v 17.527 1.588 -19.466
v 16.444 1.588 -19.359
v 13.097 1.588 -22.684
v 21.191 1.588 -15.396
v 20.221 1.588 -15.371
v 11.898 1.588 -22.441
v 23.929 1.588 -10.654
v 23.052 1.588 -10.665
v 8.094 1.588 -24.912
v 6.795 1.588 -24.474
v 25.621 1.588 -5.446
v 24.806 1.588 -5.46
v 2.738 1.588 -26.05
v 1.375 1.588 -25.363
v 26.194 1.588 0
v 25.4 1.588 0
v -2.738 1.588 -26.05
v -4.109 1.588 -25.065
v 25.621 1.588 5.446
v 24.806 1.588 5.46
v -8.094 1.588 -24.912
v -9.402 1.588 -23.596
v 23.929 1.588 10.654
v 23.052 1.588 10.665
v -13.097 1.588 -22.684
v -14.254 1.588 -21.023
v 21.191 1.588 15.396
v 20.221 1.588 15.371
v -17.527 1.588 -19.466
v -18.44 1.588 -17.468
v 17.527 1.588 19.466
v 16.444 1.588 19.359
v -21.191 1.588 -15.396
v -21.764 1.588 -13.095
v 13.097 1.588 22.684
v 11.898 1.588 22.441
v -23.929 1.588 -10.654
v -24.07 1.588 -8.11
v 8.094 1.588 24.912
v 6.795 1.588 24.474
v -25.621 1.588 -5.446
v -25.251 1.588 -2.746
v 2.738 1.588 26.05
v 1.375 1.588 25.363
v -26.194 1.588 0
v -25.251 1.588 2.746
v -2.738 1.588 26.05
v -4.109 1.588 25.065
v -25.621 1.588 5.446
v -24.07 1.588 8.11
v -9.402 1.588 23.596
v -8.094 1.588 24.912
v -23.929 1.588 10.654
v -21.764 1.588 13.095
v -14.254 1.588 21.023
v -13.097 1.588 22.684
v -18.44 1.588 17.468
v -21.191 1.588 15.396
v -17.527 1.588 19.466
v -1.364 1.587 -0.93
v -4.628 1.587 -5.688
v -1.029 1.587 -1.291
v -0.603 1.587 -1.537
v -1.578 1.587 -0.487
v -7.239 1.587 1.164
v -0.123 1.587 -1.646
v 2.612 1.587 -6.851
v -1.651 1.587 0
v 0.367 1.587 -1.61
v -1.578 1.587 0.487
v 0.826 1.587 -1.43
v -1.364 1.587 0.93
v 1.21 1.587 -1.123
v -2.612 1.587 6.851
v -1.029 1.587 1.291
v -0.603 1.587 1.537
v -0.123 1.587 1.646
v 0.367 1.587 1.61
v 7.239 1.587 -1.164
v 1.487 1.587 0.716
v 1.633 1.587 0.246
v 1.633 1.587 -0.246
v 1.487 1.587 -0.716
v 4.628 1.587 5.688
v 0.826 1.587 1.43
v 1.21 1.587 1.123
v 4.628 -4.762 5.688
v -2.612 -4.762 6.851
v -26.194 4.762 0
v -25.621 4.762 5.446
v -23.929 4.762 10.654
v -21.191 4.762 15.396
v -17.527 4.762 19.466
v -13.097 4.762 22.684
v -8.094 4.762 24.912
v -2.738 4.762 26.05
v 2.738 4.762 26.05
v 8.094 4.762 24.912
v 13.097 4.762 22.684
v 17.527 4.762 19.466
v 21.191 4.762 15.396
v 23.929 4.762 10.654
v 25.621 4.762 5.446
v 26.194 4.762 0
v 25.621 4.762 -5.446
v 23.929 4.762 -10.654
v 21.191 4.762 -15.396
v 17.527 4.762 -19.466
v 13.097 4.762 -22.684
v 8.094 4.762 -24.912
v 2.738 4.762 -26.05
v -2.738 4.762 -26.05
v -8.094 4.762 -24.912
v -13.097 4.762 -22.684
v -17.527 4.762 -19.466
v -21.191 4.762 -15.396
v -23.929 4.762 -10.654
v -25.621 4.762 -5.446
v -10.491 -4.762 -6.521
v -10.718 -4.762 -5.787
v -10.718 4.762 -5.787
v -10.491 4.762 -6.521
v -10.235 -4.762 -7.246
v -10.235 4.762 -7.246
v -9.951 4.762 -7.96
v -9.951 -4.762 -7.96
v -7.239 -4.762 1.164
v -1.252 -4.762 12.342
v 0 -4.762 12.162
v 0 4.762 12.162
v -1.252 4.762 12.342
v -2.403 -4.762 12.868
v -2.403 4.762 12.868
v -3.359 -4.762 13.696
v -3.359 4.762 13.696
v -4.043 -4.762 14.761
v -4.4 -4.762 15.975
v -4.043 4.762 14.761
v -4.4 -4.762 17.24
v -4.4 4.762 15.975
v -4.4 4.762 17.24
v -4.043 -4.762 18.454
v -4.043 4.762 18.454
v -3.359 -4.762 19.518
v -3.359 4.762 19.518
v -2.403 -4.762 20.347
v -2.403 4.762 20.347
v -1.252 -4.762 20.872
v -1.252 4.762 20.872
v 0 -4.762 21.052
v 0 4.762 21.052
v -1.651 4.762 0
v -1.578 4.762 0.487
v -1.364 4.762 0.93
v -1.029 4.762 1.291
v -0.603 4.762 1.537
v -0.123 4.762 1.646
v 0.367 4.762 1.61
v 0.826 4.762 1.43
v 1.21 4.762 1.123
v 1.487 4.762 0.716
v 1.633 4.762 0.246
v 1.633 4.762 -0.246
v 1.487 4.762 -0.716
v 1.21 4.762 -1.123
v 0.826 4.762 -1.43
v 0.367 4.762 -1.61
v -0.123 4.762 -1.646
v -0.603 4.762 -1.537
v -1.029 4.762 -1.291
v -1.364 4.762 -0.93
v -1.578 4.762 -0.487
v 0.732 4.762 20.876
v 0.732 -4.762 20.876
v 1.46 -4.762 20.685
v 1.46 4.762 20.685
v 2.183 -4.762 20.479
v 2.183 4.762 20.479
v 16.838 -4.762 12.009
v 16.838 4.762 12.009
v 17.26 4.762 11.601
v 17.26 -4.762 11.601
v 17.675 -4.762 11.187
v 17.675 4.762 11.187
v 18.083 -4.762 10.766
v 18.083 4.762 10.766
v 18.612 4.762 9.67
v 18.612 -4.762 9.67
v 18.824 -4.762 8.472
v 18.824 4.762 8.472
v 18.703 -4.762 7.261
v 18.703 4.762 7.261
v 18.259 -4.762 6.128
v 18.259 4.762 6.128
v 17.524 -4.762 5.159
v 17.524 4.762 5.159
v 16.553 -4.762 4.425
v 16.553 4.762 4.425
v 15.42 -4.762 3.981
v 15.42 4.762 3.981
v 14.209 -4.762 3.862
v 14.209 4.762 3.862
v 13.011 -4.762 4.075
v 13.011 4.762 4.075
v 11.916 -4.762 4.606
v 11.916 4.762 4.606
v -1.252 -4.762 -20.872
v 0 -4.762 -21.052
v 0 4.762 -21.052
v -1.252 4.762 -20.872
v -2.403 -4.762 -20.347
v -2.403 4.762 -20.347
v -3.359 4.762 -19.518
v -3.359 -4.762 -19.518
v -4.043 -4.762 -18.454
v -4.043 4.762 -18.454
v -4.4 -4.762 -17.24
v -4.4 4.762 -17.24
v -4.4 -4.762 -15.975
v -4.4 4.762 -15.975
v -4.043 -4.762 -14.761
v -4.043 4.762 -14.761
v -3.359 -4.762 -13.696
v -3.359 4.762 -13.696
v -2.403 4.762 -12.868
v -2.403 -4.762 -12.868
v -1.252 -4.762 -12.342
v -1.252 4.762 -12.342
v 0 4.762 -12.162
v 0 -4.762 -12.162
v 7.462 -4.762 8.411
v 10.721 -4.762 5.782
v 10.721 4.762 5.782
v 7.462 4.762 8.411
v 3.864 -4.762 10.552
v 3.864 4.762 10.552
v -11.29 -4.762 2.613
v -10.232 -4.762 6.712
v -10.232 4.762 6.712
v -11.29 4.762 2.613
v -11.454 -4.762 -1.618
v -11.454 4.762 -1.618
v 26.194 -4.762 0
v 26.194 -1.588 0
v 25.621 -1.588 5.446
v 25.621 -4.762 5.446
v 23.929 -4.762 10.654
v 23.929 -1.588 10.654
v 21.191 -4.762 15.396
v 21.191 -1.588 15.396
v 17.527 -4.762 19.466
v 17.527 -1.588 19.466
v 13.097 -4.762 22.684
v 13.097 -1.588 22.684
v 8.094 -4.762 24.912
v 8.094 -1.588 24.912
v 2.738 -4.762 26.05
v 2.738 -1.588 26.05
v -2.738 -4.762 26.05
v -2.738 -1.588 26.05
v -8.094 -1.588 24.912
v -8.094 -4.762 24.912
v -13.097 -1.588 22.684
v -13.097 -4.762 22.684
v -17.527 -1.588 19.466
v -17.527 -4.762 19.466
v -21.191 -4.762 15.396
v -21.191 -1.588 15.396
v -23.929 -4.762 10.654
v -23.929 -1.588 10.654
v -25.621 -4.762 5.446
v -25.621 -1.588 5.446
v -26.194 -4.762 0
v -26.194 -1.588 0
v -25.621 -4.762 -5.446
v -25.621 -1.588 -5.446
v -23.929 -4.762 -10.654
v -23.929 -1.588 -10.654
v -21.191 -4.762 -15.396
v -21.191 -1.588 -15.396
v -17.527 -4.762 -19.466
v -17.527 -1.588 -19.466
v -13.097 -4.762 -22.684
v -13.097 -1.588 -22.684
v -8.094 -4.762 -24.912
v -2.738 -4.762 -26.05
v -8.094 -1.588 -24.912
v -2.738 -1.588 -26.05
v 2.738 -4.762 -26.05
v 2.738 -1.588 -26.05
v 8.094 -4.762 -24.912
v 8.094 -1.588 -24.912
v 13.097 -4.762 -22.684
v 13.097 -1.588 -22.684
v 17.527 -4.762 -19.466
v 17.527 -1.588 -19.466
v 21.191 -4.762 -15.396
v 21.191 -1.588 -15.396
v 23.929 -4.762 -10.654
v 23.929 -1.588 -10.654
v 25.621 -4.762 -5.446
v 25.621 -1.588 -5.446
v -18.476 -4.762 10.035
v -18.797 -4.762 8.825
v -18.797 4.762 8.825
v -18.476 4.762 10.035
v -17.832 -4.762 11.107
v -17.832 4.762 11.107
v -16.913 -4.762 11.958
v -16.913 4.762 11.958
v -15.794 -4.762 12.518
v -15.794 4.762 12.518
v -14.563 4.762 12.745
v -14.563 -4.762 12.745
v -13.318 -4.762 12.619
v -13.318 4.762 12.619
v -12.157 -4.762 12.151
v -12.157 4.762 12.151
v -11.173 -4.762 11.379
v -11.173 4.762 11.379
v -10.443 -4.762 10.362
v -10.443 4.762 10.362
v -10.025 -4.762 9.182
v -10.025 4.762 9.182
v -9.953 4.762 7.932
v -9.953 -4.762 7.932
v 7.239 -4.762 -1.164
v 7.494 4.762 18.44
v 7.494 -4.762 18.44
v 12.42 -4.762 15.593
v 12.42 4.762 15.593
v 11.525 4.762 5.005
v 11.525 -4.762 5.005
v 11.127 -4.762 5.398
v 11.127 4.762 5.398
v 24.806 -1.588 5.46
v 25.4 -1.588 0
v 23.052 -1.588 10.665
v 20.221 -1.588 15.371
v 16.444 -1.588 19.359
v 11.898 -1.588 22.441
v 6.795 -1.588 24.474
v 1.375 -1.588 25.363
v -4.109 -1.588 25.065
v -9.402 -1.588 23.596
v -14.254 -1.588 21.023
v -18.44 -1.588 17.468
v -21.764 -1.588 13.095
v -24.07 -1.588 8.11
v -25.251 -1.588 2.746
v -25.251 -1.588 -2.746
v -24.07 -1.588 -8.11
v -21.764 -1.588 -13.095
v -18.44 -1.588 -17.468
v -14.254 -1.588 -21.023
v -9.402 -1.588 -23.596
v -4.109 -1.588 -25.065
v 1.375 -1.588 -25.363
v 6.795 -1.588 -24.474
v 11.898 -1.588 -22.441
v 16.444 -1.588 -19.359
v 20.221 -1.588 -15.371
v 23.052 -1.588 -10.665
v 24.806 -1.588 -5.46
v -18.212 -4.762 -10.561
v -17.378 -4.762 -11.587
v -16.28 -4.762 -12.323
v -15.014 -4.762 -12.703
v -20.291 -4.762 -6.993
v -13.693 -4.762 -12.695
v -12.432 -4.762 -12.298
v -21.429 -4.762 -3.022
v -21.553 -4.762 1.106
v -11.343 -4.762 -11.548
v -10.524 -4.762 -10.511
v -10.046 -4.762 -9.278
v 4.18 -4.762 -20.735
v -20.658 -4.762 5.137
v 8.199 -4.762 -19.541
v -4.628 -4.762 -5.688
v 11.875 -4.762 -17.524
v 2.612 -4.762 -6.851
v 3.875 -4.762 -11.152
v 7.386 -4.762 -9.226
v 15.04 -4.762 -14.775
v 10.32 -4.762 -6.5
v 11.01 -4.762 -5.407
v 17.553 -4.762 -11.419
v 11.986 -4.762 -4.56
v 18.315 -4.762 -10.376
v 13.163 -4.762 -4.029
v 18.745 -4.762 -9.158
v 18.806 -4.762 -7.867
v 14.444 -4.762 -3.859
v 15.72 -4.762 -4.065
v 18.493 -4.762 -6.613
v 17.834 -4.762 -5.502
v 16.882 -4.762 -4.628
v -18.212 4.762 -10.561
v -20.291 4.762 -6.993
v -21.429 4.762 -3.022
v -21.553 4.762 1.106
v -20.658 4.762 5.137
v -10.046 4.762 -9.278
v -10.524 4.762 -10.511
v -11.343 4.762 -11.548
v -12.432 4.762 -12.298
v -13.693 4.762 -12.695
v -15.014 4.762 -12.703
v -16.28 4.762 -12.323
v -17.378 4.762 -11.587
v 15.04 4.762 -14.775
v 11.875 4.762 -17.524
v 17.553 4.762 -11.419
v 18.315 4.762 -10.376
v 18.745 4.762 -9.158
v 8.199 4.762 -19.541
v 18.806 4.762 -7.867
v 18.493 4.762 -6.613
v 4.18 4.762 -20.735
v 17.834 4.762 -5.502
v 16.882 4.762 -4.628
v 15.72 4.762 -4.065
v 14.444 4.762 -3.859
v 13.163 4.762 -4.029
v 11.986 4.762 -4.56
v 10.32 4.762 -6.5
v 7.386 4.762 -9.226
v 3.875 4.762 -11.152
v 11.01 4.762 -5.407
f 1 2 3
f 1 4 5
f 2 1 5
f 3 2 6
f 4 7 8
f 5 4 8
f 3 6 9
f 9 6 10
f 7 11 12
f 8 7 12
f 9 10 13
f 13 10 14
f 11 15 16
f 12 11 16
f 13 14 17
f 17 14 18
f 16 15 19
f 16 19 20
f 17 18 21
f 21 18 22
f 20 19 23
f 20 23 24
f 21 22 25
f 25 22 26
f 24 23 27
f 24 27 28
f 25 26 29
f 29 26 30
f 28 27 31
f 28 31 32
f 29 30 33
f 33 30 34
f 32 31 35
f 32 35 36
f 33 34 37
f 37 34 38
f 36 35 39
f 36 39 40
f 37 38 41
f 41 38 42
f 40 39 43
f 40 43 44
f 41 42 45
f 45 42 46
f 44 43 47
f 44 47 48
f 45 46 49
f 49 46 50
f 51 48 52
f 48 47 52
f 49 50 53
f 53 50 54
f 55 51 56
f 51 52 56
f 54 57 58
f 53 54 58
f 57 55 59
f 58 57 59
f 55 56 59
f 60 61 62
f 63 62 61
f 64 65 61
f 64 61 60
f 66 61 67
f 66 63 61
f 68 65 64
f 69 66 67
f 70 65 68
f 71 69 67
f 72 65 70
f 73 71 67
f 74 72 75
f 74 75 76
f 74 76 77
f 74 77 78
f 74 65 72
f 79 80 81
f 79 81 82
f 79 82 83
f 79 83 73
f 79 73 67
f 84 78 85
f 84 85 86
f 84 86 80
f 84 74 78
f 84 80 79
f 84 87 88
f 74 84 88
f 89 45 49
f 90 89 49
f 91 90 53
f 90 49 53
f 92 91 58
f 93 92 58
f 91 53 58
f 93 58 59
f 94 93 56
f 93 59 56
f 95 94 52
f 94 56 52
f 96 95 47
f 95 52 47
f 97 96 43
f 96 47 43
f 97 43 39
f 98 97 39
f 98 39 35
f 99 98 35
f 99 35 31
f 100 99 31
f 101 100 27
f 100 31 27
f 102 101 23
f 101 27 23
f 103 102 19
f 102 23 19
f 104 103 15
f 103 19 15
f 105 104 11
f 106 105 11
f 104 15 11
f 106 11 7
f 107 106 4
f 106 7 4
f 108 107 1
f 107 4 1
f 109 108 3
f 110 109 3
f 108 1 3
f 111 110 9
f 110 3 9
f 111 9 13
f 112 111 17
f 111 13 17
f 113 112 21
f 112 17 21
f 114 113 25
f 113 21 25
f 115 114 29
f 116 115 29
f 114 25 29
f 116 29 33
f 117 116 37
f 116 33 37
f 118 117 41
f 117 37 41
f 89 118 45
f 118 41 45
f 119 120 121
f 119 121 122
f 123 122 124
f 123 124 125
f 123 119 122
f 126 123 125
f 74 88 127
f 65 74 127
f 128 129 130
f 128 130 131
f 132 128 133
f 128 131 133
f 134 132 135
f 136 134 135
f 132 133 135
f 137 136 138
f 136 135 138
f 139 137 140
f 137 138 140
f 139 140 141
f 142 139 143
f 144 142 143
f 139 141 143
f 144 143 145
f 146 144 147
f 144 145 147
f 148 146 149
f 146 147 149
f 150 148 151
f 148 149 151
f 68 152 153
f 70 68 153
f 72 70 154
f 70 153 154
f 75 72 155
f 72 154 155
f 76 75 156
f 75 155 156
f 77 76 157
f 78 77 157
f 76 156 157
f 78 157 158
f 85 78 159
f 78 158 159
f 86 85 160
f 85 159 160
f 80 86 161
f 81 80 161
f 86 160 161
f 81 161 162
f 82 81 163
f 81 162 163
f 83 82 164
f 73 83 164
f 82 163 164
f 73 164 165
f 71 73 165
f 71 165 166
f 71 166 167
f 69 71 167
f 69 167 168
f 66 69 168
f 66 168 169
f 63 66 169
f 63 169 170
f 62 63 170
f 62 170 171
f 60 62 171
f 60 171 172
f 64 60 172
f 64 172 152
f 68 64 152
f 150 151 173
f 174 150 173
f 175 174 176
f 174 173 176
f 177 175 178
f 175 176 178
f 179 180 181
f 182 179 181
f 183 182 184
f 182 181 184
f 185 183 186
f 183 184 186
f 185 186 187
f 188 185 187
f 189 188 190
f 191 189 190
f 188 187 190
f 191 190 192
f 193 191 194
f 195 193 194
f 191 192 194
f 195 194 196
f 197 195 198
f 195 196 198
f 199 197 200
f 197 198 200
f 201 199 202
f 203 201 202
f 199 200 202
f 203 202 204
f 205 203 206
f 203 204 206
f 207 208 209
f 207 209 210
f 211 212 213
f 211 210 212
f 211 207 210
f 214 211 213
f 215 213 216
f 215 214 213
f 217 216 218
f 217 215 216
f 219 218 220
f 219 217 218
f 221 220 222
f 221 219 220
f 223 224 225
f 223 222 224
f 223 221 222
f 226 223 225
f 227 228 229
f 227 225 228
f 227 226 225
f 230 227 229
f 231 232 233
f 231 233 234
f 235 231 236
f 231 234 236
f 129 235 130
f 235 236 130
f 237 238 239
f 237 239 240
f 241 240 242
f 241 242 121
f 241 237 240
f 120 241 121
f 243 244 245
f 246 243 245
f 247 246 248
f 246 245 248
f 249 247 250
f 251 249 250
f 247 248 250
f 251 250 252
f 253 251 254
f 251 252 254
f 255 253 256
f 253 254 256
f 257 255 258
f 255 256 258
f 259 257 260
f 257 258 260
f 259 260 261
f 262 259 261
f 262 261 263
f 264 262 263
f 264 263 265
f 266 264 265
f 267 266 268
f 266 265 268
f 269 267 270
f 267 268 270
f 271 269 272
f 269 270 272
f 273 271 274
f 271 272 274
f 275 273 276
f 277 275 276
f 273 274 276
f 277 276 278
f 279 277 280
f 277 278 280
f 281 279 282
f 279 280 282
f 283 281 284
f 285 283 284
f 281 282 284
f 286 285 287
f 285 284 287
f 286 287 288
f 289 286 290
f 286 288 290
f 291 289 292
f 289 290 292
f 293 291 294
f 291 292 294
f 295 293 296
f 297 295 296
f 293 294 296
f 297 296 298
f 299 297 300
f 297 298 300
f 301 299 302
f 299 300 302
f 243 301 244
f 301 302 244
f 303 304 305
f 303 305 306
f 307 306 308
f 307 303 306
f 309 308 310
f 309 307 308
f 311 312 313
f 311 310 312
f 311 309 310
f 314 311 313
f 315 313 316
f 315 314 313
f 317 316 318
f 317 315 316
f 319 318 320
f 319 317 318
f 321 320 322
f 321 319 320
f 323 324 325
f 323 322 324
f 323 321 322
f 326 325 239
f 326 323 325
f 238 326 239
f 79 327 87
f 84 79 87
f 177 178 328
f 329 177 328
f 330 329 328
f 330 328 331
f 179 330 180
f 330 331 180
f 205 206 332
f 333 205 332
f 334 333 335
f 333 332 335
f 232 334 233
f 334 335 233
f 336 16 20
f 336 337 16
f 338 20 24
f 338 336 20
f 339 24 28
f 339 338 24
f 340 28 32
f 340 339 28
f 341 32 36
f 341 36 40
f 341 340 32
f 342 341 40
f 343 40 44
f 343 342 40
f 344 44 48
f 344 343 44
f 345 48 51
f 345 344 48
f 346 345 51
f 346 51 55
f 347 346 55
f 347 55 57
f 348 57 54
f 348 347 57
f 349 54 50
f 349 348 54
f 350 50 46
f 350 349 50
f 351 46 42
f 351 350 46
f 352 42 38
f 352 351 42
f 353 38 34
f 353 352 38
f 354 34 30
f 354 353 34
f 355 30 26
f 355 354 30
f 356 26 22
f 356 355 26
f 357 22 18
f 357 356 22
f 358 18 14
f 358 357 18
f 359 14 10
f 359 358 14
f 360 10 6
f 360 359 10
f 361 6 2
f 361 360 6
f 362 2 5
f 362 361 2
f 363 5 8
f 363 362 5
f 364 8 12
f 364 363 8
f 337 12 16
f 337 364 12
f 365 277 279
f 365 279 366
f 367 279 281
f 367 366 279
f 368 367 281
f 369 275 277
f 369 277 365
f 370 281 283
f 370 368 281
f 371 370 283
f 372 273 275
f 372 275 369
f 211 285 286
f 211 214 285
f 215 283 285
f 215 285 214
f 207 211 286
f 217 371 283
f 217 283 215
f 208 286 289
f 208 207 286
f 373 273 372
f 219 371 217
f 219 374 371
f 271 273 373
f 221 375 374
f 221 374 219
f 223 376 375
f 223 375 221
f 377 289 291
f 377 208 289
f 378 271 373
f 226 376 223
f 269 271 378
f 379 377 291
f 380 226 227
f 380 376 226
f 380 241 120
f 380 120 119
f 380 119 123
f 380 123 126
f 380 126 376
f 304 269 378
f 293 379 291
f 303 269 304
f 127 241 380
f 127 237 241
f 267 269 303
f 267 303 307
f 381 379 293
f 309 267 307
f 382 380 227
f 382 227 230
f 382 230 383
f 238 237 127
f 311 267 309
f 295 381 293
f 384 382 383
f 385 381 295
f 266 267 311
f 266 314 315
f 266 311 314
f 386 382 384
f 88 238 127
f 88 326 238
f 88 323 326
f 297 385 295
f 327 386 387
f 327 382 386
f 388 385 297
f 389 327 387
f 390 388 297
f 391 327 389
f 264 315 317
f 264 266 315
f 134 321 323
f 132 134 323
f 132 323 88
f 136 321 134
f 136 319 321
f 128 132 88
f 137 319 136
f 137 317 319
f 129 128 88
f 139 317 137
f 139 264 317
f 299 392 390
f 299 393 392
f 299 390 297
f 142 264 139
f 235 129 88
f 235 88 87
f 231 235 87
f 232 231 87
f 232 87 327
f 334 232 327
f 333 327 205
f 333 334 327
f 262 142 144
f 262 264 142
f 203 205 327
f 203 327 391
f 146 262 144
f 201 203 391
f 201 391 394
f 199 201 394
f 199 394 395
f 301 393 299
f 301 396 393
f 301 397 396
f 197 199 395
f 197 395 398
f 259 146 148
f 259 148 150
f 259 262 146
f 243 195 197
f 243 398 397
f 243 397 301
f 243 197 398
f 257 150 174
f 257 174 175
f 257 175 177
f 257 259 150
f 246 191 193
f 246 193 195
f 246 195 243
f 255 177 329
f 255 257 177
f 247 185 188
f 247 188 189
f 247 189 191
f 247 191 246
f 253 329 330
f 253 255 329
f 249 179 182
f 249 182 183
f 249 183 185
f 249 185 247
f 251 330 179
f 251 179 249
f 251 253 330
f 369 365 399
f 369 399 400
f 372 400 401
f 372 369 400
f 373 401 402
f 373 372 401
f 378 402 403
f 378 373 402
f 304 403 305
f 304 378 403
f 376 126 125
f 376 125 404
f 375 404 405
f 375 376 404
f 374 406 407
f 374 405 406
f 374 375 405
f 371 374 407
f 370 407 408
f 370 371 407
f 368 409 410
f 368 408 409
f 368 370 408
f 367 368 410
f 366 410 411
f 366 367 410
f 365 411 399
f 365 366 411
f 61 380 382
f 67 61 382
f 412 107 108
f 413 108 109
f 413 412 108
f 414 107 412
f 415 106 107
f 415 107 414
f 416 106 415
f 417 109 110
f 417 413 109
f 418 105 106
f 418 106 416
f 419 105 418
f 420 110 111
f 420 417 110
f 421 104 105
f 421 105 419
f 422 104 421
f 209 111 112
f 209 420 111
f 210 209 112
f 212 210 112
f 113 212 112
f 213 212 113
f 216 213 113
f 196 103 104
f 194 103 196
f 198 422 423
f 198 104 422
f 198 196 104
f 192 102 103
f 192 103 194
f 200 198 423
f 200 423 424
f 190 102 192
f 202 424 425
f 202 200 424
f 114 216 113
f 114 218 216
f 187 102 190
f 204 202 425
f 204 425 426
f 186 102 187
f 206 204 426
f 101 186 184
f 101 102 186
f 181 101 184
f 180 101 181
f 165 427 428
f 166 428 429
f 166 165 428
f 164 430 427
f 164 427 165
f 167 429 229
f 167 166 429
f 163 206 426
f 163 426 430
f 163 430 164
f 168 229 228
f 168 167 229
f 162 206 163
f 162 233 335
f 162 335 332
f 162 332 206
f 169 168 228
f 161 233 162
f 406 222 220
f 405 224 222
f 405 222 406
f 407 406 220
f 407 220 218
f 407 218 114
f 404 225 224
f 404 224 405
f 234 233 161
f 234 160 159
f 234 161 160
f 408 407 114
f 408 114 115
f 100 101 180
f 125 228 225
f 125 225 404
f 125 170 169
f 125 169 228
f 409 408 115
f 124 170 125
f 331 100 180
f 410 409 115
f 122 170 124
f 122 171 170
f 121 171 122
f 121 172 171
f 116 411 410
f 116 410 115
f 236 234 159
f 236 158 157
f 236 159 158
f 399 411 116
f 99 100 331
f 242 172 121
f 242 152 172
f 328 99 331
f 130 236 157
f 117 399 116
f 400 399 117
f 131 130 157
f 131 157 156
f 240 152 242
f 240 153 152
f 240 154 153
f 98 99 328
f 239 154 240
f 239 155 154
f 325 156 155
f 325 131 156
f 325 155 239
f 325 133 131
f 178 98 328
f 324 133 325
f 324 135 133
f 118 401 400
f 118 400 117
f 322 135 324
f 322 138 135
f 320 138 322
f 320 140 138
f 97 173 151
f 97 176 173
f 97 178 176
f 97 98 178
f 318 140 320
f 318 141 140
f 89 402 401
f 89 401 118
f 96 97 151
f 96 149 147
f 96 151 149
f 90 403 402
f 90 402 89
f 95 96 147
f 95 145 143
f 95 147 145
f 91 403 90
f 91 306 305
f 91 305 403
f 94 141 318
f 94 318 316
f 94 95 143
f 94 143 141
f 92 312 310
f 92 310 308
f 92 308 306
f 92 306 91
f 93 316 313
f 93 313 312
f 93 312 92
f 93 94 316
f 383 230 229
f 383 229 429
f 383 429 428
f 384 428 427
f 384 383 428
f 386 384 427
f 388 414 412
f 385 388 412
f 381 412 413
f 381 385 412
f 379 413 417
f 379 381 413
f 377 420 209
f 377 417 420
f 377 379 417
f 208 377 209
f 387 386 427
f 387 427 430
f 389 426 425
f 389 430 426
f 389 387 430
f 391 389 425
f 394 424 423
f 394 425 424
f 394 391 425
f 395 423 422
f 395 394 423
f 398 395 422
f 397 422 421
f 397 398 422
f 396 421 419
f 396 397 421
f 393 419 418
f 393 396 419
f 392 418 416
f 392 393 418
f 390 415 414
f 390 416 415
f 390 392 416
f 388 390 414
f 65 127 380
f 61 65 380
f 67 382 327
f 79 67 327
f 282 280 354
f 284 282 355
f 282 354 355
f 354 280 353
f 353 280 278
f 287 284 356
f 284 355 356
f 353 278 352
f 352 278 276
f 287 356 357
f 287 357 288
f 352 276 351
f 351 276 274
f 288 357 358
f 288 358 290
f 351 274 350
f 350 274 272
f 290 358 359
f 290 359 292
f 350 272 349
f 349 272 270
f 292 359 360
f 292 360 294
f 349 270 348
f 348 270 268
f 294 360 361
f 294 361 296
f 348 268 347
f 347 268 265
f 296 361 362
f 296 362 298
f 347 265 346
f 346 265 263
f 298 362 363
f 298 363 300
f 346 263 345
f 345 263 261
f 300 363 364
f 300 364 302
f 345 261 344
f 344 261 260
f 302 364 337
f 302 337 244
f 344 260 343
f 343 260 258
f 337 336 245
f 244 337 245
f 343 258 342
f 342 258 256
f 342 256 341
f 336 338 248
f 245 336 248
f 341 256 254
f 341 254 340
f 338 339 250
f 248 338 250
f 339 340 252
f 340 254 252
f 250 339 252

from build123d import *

# Parameters (mm, degrees)
F0_R      = 25.4
F1_DEPTH  = 1.5875
F2_R      = 26.19375
F3_DEPTH  = 3.175
F4_R      = 26.19375
F5_DEPTH  = 3.175
F7_DEPTH  = 38.1
F9_DEPTH  = 6.35
F10_R     = 1.651
F11_DEPTH = 25.4


with BuildPart() as f1:
    # F0 (on Front) → F1 (new body, symmetric)
    with BuildSketch(Plane.XZ):
        Circle(F0_R)
    extrude(amount=F1_DEPTH, both=True)

    # F2 (on face) → F3 (join)
    with BuildSketch(Plane.XZ.offset(1.5875)):
        Circle(F2_R)
    extrude(amount=F3_DEPTH)

    # F4 (on face) → F5 (join)
    with BuildSketch(Plane(origin=(0, 1.5875, 0), x_dir=(-1, 0, 0), z_dir=(0, 1, 0))):
        Circle(F4_R)
    extrude(amount=F5_DEPTH)

    # F6 (on face) → F7 (cut, symmetric)
    with BuildSketch(Plane(origin=(0, 4.7625, 0), x_dir=(-1, 0, 0), z_dir=(0, 1, 0))):
        with BuildLine():
            ThreePointArc((-17.552633, -11.419258), (-10.090636, -18.630629), (0, -21.052268))
            ThreePointArc((0, -21.052268), (4.445, -16.607268), (0, -12.162268))
            ThreePointArc((0, -12.162268), (-5.690238, -10.297309), (-10.319898, -6.49953))
            ThreePointArc((-10.319898, -6.49953), (-16.882294, -4.628293), (-17.552633, -11.419258))
        make_face()
        with BuildLine():
            ThreePointArc((10.231966, 6.712214), (11.485159, 0.501891), (10.718335, -5.787035))
            ThreePointArc((10.718335, -5.787035), (10.366031, -6.884623), (9.950625, -7.959916))
            ThreePointArc((9.950625, -7.959916), (13.047399, -12.543448), (18.211526, -10.560884))
            ThreePointArc((18.211526, -10.560884), (21.619656, -0.962225), (18.79669, 8.824525))
            ThreePointArc((18.79669, 8.824525), (13.317942, 12.619318), (10.231966, 6.712214))
        make_face()
        with BuildLine():
            ThreePointArc((-10.721463, 5.782488), (-5.701405, 9.544893), (0, 12.162268))
            ThreePointArc((0, 12.162268), (4.445, 16.607268), (0, 21.052268))
            ThreePointArc((0, 21.052268), (-1.096134, 20.782721), (-2.183325, 20.479104))
            ThreePointArc((-2.183325, 20.479104), (-10.013079, 17.11314), (-16.838004, 12.008714))
            ThreePointArc((-16.838004, 12.008714), (-17.468207, 11.394684), (-18.083289, 10.765508))
            ThreePointArc((-18.083289, 10.765508), (-17.523515, 5.158655), (-11.915992, 4.605625))
            ThreePointArc((-11.915992, 4.605625), (-11.32708, 5.202535), (-10.721463, 5.782488))
        make_face()
    extrude(amount=F7_DEPTH, both=True, mode=Mode.SUBTRACT)

    # F8 (on face) → F9 (cut)
    with BuildSketch(Plane.XZ.offset(4.7625)):
        Polygon((2.611876, -6.851382), (7.239409, -1.16374), (4.627533, 5.687642), (-2.611876, 6.851382), (-7.239409, 1.16374), (-4.627533, -5.687642), align=None)
    extrude(amount=-F9_DEPTH, mode=Mode.SUBTRACT)

    # F10 (on face) → F11 (cut)
    with BuildSketch(Plane(origin=(0, 4.7625, 0), x_dir=(-1, 0, 0), z_dir=(0, 1, 0))):
        Circle(F10_R)
    extrude(amount=-F11_DEPTH, mode=Mode.SUBTRACT)


solid = f1.part
